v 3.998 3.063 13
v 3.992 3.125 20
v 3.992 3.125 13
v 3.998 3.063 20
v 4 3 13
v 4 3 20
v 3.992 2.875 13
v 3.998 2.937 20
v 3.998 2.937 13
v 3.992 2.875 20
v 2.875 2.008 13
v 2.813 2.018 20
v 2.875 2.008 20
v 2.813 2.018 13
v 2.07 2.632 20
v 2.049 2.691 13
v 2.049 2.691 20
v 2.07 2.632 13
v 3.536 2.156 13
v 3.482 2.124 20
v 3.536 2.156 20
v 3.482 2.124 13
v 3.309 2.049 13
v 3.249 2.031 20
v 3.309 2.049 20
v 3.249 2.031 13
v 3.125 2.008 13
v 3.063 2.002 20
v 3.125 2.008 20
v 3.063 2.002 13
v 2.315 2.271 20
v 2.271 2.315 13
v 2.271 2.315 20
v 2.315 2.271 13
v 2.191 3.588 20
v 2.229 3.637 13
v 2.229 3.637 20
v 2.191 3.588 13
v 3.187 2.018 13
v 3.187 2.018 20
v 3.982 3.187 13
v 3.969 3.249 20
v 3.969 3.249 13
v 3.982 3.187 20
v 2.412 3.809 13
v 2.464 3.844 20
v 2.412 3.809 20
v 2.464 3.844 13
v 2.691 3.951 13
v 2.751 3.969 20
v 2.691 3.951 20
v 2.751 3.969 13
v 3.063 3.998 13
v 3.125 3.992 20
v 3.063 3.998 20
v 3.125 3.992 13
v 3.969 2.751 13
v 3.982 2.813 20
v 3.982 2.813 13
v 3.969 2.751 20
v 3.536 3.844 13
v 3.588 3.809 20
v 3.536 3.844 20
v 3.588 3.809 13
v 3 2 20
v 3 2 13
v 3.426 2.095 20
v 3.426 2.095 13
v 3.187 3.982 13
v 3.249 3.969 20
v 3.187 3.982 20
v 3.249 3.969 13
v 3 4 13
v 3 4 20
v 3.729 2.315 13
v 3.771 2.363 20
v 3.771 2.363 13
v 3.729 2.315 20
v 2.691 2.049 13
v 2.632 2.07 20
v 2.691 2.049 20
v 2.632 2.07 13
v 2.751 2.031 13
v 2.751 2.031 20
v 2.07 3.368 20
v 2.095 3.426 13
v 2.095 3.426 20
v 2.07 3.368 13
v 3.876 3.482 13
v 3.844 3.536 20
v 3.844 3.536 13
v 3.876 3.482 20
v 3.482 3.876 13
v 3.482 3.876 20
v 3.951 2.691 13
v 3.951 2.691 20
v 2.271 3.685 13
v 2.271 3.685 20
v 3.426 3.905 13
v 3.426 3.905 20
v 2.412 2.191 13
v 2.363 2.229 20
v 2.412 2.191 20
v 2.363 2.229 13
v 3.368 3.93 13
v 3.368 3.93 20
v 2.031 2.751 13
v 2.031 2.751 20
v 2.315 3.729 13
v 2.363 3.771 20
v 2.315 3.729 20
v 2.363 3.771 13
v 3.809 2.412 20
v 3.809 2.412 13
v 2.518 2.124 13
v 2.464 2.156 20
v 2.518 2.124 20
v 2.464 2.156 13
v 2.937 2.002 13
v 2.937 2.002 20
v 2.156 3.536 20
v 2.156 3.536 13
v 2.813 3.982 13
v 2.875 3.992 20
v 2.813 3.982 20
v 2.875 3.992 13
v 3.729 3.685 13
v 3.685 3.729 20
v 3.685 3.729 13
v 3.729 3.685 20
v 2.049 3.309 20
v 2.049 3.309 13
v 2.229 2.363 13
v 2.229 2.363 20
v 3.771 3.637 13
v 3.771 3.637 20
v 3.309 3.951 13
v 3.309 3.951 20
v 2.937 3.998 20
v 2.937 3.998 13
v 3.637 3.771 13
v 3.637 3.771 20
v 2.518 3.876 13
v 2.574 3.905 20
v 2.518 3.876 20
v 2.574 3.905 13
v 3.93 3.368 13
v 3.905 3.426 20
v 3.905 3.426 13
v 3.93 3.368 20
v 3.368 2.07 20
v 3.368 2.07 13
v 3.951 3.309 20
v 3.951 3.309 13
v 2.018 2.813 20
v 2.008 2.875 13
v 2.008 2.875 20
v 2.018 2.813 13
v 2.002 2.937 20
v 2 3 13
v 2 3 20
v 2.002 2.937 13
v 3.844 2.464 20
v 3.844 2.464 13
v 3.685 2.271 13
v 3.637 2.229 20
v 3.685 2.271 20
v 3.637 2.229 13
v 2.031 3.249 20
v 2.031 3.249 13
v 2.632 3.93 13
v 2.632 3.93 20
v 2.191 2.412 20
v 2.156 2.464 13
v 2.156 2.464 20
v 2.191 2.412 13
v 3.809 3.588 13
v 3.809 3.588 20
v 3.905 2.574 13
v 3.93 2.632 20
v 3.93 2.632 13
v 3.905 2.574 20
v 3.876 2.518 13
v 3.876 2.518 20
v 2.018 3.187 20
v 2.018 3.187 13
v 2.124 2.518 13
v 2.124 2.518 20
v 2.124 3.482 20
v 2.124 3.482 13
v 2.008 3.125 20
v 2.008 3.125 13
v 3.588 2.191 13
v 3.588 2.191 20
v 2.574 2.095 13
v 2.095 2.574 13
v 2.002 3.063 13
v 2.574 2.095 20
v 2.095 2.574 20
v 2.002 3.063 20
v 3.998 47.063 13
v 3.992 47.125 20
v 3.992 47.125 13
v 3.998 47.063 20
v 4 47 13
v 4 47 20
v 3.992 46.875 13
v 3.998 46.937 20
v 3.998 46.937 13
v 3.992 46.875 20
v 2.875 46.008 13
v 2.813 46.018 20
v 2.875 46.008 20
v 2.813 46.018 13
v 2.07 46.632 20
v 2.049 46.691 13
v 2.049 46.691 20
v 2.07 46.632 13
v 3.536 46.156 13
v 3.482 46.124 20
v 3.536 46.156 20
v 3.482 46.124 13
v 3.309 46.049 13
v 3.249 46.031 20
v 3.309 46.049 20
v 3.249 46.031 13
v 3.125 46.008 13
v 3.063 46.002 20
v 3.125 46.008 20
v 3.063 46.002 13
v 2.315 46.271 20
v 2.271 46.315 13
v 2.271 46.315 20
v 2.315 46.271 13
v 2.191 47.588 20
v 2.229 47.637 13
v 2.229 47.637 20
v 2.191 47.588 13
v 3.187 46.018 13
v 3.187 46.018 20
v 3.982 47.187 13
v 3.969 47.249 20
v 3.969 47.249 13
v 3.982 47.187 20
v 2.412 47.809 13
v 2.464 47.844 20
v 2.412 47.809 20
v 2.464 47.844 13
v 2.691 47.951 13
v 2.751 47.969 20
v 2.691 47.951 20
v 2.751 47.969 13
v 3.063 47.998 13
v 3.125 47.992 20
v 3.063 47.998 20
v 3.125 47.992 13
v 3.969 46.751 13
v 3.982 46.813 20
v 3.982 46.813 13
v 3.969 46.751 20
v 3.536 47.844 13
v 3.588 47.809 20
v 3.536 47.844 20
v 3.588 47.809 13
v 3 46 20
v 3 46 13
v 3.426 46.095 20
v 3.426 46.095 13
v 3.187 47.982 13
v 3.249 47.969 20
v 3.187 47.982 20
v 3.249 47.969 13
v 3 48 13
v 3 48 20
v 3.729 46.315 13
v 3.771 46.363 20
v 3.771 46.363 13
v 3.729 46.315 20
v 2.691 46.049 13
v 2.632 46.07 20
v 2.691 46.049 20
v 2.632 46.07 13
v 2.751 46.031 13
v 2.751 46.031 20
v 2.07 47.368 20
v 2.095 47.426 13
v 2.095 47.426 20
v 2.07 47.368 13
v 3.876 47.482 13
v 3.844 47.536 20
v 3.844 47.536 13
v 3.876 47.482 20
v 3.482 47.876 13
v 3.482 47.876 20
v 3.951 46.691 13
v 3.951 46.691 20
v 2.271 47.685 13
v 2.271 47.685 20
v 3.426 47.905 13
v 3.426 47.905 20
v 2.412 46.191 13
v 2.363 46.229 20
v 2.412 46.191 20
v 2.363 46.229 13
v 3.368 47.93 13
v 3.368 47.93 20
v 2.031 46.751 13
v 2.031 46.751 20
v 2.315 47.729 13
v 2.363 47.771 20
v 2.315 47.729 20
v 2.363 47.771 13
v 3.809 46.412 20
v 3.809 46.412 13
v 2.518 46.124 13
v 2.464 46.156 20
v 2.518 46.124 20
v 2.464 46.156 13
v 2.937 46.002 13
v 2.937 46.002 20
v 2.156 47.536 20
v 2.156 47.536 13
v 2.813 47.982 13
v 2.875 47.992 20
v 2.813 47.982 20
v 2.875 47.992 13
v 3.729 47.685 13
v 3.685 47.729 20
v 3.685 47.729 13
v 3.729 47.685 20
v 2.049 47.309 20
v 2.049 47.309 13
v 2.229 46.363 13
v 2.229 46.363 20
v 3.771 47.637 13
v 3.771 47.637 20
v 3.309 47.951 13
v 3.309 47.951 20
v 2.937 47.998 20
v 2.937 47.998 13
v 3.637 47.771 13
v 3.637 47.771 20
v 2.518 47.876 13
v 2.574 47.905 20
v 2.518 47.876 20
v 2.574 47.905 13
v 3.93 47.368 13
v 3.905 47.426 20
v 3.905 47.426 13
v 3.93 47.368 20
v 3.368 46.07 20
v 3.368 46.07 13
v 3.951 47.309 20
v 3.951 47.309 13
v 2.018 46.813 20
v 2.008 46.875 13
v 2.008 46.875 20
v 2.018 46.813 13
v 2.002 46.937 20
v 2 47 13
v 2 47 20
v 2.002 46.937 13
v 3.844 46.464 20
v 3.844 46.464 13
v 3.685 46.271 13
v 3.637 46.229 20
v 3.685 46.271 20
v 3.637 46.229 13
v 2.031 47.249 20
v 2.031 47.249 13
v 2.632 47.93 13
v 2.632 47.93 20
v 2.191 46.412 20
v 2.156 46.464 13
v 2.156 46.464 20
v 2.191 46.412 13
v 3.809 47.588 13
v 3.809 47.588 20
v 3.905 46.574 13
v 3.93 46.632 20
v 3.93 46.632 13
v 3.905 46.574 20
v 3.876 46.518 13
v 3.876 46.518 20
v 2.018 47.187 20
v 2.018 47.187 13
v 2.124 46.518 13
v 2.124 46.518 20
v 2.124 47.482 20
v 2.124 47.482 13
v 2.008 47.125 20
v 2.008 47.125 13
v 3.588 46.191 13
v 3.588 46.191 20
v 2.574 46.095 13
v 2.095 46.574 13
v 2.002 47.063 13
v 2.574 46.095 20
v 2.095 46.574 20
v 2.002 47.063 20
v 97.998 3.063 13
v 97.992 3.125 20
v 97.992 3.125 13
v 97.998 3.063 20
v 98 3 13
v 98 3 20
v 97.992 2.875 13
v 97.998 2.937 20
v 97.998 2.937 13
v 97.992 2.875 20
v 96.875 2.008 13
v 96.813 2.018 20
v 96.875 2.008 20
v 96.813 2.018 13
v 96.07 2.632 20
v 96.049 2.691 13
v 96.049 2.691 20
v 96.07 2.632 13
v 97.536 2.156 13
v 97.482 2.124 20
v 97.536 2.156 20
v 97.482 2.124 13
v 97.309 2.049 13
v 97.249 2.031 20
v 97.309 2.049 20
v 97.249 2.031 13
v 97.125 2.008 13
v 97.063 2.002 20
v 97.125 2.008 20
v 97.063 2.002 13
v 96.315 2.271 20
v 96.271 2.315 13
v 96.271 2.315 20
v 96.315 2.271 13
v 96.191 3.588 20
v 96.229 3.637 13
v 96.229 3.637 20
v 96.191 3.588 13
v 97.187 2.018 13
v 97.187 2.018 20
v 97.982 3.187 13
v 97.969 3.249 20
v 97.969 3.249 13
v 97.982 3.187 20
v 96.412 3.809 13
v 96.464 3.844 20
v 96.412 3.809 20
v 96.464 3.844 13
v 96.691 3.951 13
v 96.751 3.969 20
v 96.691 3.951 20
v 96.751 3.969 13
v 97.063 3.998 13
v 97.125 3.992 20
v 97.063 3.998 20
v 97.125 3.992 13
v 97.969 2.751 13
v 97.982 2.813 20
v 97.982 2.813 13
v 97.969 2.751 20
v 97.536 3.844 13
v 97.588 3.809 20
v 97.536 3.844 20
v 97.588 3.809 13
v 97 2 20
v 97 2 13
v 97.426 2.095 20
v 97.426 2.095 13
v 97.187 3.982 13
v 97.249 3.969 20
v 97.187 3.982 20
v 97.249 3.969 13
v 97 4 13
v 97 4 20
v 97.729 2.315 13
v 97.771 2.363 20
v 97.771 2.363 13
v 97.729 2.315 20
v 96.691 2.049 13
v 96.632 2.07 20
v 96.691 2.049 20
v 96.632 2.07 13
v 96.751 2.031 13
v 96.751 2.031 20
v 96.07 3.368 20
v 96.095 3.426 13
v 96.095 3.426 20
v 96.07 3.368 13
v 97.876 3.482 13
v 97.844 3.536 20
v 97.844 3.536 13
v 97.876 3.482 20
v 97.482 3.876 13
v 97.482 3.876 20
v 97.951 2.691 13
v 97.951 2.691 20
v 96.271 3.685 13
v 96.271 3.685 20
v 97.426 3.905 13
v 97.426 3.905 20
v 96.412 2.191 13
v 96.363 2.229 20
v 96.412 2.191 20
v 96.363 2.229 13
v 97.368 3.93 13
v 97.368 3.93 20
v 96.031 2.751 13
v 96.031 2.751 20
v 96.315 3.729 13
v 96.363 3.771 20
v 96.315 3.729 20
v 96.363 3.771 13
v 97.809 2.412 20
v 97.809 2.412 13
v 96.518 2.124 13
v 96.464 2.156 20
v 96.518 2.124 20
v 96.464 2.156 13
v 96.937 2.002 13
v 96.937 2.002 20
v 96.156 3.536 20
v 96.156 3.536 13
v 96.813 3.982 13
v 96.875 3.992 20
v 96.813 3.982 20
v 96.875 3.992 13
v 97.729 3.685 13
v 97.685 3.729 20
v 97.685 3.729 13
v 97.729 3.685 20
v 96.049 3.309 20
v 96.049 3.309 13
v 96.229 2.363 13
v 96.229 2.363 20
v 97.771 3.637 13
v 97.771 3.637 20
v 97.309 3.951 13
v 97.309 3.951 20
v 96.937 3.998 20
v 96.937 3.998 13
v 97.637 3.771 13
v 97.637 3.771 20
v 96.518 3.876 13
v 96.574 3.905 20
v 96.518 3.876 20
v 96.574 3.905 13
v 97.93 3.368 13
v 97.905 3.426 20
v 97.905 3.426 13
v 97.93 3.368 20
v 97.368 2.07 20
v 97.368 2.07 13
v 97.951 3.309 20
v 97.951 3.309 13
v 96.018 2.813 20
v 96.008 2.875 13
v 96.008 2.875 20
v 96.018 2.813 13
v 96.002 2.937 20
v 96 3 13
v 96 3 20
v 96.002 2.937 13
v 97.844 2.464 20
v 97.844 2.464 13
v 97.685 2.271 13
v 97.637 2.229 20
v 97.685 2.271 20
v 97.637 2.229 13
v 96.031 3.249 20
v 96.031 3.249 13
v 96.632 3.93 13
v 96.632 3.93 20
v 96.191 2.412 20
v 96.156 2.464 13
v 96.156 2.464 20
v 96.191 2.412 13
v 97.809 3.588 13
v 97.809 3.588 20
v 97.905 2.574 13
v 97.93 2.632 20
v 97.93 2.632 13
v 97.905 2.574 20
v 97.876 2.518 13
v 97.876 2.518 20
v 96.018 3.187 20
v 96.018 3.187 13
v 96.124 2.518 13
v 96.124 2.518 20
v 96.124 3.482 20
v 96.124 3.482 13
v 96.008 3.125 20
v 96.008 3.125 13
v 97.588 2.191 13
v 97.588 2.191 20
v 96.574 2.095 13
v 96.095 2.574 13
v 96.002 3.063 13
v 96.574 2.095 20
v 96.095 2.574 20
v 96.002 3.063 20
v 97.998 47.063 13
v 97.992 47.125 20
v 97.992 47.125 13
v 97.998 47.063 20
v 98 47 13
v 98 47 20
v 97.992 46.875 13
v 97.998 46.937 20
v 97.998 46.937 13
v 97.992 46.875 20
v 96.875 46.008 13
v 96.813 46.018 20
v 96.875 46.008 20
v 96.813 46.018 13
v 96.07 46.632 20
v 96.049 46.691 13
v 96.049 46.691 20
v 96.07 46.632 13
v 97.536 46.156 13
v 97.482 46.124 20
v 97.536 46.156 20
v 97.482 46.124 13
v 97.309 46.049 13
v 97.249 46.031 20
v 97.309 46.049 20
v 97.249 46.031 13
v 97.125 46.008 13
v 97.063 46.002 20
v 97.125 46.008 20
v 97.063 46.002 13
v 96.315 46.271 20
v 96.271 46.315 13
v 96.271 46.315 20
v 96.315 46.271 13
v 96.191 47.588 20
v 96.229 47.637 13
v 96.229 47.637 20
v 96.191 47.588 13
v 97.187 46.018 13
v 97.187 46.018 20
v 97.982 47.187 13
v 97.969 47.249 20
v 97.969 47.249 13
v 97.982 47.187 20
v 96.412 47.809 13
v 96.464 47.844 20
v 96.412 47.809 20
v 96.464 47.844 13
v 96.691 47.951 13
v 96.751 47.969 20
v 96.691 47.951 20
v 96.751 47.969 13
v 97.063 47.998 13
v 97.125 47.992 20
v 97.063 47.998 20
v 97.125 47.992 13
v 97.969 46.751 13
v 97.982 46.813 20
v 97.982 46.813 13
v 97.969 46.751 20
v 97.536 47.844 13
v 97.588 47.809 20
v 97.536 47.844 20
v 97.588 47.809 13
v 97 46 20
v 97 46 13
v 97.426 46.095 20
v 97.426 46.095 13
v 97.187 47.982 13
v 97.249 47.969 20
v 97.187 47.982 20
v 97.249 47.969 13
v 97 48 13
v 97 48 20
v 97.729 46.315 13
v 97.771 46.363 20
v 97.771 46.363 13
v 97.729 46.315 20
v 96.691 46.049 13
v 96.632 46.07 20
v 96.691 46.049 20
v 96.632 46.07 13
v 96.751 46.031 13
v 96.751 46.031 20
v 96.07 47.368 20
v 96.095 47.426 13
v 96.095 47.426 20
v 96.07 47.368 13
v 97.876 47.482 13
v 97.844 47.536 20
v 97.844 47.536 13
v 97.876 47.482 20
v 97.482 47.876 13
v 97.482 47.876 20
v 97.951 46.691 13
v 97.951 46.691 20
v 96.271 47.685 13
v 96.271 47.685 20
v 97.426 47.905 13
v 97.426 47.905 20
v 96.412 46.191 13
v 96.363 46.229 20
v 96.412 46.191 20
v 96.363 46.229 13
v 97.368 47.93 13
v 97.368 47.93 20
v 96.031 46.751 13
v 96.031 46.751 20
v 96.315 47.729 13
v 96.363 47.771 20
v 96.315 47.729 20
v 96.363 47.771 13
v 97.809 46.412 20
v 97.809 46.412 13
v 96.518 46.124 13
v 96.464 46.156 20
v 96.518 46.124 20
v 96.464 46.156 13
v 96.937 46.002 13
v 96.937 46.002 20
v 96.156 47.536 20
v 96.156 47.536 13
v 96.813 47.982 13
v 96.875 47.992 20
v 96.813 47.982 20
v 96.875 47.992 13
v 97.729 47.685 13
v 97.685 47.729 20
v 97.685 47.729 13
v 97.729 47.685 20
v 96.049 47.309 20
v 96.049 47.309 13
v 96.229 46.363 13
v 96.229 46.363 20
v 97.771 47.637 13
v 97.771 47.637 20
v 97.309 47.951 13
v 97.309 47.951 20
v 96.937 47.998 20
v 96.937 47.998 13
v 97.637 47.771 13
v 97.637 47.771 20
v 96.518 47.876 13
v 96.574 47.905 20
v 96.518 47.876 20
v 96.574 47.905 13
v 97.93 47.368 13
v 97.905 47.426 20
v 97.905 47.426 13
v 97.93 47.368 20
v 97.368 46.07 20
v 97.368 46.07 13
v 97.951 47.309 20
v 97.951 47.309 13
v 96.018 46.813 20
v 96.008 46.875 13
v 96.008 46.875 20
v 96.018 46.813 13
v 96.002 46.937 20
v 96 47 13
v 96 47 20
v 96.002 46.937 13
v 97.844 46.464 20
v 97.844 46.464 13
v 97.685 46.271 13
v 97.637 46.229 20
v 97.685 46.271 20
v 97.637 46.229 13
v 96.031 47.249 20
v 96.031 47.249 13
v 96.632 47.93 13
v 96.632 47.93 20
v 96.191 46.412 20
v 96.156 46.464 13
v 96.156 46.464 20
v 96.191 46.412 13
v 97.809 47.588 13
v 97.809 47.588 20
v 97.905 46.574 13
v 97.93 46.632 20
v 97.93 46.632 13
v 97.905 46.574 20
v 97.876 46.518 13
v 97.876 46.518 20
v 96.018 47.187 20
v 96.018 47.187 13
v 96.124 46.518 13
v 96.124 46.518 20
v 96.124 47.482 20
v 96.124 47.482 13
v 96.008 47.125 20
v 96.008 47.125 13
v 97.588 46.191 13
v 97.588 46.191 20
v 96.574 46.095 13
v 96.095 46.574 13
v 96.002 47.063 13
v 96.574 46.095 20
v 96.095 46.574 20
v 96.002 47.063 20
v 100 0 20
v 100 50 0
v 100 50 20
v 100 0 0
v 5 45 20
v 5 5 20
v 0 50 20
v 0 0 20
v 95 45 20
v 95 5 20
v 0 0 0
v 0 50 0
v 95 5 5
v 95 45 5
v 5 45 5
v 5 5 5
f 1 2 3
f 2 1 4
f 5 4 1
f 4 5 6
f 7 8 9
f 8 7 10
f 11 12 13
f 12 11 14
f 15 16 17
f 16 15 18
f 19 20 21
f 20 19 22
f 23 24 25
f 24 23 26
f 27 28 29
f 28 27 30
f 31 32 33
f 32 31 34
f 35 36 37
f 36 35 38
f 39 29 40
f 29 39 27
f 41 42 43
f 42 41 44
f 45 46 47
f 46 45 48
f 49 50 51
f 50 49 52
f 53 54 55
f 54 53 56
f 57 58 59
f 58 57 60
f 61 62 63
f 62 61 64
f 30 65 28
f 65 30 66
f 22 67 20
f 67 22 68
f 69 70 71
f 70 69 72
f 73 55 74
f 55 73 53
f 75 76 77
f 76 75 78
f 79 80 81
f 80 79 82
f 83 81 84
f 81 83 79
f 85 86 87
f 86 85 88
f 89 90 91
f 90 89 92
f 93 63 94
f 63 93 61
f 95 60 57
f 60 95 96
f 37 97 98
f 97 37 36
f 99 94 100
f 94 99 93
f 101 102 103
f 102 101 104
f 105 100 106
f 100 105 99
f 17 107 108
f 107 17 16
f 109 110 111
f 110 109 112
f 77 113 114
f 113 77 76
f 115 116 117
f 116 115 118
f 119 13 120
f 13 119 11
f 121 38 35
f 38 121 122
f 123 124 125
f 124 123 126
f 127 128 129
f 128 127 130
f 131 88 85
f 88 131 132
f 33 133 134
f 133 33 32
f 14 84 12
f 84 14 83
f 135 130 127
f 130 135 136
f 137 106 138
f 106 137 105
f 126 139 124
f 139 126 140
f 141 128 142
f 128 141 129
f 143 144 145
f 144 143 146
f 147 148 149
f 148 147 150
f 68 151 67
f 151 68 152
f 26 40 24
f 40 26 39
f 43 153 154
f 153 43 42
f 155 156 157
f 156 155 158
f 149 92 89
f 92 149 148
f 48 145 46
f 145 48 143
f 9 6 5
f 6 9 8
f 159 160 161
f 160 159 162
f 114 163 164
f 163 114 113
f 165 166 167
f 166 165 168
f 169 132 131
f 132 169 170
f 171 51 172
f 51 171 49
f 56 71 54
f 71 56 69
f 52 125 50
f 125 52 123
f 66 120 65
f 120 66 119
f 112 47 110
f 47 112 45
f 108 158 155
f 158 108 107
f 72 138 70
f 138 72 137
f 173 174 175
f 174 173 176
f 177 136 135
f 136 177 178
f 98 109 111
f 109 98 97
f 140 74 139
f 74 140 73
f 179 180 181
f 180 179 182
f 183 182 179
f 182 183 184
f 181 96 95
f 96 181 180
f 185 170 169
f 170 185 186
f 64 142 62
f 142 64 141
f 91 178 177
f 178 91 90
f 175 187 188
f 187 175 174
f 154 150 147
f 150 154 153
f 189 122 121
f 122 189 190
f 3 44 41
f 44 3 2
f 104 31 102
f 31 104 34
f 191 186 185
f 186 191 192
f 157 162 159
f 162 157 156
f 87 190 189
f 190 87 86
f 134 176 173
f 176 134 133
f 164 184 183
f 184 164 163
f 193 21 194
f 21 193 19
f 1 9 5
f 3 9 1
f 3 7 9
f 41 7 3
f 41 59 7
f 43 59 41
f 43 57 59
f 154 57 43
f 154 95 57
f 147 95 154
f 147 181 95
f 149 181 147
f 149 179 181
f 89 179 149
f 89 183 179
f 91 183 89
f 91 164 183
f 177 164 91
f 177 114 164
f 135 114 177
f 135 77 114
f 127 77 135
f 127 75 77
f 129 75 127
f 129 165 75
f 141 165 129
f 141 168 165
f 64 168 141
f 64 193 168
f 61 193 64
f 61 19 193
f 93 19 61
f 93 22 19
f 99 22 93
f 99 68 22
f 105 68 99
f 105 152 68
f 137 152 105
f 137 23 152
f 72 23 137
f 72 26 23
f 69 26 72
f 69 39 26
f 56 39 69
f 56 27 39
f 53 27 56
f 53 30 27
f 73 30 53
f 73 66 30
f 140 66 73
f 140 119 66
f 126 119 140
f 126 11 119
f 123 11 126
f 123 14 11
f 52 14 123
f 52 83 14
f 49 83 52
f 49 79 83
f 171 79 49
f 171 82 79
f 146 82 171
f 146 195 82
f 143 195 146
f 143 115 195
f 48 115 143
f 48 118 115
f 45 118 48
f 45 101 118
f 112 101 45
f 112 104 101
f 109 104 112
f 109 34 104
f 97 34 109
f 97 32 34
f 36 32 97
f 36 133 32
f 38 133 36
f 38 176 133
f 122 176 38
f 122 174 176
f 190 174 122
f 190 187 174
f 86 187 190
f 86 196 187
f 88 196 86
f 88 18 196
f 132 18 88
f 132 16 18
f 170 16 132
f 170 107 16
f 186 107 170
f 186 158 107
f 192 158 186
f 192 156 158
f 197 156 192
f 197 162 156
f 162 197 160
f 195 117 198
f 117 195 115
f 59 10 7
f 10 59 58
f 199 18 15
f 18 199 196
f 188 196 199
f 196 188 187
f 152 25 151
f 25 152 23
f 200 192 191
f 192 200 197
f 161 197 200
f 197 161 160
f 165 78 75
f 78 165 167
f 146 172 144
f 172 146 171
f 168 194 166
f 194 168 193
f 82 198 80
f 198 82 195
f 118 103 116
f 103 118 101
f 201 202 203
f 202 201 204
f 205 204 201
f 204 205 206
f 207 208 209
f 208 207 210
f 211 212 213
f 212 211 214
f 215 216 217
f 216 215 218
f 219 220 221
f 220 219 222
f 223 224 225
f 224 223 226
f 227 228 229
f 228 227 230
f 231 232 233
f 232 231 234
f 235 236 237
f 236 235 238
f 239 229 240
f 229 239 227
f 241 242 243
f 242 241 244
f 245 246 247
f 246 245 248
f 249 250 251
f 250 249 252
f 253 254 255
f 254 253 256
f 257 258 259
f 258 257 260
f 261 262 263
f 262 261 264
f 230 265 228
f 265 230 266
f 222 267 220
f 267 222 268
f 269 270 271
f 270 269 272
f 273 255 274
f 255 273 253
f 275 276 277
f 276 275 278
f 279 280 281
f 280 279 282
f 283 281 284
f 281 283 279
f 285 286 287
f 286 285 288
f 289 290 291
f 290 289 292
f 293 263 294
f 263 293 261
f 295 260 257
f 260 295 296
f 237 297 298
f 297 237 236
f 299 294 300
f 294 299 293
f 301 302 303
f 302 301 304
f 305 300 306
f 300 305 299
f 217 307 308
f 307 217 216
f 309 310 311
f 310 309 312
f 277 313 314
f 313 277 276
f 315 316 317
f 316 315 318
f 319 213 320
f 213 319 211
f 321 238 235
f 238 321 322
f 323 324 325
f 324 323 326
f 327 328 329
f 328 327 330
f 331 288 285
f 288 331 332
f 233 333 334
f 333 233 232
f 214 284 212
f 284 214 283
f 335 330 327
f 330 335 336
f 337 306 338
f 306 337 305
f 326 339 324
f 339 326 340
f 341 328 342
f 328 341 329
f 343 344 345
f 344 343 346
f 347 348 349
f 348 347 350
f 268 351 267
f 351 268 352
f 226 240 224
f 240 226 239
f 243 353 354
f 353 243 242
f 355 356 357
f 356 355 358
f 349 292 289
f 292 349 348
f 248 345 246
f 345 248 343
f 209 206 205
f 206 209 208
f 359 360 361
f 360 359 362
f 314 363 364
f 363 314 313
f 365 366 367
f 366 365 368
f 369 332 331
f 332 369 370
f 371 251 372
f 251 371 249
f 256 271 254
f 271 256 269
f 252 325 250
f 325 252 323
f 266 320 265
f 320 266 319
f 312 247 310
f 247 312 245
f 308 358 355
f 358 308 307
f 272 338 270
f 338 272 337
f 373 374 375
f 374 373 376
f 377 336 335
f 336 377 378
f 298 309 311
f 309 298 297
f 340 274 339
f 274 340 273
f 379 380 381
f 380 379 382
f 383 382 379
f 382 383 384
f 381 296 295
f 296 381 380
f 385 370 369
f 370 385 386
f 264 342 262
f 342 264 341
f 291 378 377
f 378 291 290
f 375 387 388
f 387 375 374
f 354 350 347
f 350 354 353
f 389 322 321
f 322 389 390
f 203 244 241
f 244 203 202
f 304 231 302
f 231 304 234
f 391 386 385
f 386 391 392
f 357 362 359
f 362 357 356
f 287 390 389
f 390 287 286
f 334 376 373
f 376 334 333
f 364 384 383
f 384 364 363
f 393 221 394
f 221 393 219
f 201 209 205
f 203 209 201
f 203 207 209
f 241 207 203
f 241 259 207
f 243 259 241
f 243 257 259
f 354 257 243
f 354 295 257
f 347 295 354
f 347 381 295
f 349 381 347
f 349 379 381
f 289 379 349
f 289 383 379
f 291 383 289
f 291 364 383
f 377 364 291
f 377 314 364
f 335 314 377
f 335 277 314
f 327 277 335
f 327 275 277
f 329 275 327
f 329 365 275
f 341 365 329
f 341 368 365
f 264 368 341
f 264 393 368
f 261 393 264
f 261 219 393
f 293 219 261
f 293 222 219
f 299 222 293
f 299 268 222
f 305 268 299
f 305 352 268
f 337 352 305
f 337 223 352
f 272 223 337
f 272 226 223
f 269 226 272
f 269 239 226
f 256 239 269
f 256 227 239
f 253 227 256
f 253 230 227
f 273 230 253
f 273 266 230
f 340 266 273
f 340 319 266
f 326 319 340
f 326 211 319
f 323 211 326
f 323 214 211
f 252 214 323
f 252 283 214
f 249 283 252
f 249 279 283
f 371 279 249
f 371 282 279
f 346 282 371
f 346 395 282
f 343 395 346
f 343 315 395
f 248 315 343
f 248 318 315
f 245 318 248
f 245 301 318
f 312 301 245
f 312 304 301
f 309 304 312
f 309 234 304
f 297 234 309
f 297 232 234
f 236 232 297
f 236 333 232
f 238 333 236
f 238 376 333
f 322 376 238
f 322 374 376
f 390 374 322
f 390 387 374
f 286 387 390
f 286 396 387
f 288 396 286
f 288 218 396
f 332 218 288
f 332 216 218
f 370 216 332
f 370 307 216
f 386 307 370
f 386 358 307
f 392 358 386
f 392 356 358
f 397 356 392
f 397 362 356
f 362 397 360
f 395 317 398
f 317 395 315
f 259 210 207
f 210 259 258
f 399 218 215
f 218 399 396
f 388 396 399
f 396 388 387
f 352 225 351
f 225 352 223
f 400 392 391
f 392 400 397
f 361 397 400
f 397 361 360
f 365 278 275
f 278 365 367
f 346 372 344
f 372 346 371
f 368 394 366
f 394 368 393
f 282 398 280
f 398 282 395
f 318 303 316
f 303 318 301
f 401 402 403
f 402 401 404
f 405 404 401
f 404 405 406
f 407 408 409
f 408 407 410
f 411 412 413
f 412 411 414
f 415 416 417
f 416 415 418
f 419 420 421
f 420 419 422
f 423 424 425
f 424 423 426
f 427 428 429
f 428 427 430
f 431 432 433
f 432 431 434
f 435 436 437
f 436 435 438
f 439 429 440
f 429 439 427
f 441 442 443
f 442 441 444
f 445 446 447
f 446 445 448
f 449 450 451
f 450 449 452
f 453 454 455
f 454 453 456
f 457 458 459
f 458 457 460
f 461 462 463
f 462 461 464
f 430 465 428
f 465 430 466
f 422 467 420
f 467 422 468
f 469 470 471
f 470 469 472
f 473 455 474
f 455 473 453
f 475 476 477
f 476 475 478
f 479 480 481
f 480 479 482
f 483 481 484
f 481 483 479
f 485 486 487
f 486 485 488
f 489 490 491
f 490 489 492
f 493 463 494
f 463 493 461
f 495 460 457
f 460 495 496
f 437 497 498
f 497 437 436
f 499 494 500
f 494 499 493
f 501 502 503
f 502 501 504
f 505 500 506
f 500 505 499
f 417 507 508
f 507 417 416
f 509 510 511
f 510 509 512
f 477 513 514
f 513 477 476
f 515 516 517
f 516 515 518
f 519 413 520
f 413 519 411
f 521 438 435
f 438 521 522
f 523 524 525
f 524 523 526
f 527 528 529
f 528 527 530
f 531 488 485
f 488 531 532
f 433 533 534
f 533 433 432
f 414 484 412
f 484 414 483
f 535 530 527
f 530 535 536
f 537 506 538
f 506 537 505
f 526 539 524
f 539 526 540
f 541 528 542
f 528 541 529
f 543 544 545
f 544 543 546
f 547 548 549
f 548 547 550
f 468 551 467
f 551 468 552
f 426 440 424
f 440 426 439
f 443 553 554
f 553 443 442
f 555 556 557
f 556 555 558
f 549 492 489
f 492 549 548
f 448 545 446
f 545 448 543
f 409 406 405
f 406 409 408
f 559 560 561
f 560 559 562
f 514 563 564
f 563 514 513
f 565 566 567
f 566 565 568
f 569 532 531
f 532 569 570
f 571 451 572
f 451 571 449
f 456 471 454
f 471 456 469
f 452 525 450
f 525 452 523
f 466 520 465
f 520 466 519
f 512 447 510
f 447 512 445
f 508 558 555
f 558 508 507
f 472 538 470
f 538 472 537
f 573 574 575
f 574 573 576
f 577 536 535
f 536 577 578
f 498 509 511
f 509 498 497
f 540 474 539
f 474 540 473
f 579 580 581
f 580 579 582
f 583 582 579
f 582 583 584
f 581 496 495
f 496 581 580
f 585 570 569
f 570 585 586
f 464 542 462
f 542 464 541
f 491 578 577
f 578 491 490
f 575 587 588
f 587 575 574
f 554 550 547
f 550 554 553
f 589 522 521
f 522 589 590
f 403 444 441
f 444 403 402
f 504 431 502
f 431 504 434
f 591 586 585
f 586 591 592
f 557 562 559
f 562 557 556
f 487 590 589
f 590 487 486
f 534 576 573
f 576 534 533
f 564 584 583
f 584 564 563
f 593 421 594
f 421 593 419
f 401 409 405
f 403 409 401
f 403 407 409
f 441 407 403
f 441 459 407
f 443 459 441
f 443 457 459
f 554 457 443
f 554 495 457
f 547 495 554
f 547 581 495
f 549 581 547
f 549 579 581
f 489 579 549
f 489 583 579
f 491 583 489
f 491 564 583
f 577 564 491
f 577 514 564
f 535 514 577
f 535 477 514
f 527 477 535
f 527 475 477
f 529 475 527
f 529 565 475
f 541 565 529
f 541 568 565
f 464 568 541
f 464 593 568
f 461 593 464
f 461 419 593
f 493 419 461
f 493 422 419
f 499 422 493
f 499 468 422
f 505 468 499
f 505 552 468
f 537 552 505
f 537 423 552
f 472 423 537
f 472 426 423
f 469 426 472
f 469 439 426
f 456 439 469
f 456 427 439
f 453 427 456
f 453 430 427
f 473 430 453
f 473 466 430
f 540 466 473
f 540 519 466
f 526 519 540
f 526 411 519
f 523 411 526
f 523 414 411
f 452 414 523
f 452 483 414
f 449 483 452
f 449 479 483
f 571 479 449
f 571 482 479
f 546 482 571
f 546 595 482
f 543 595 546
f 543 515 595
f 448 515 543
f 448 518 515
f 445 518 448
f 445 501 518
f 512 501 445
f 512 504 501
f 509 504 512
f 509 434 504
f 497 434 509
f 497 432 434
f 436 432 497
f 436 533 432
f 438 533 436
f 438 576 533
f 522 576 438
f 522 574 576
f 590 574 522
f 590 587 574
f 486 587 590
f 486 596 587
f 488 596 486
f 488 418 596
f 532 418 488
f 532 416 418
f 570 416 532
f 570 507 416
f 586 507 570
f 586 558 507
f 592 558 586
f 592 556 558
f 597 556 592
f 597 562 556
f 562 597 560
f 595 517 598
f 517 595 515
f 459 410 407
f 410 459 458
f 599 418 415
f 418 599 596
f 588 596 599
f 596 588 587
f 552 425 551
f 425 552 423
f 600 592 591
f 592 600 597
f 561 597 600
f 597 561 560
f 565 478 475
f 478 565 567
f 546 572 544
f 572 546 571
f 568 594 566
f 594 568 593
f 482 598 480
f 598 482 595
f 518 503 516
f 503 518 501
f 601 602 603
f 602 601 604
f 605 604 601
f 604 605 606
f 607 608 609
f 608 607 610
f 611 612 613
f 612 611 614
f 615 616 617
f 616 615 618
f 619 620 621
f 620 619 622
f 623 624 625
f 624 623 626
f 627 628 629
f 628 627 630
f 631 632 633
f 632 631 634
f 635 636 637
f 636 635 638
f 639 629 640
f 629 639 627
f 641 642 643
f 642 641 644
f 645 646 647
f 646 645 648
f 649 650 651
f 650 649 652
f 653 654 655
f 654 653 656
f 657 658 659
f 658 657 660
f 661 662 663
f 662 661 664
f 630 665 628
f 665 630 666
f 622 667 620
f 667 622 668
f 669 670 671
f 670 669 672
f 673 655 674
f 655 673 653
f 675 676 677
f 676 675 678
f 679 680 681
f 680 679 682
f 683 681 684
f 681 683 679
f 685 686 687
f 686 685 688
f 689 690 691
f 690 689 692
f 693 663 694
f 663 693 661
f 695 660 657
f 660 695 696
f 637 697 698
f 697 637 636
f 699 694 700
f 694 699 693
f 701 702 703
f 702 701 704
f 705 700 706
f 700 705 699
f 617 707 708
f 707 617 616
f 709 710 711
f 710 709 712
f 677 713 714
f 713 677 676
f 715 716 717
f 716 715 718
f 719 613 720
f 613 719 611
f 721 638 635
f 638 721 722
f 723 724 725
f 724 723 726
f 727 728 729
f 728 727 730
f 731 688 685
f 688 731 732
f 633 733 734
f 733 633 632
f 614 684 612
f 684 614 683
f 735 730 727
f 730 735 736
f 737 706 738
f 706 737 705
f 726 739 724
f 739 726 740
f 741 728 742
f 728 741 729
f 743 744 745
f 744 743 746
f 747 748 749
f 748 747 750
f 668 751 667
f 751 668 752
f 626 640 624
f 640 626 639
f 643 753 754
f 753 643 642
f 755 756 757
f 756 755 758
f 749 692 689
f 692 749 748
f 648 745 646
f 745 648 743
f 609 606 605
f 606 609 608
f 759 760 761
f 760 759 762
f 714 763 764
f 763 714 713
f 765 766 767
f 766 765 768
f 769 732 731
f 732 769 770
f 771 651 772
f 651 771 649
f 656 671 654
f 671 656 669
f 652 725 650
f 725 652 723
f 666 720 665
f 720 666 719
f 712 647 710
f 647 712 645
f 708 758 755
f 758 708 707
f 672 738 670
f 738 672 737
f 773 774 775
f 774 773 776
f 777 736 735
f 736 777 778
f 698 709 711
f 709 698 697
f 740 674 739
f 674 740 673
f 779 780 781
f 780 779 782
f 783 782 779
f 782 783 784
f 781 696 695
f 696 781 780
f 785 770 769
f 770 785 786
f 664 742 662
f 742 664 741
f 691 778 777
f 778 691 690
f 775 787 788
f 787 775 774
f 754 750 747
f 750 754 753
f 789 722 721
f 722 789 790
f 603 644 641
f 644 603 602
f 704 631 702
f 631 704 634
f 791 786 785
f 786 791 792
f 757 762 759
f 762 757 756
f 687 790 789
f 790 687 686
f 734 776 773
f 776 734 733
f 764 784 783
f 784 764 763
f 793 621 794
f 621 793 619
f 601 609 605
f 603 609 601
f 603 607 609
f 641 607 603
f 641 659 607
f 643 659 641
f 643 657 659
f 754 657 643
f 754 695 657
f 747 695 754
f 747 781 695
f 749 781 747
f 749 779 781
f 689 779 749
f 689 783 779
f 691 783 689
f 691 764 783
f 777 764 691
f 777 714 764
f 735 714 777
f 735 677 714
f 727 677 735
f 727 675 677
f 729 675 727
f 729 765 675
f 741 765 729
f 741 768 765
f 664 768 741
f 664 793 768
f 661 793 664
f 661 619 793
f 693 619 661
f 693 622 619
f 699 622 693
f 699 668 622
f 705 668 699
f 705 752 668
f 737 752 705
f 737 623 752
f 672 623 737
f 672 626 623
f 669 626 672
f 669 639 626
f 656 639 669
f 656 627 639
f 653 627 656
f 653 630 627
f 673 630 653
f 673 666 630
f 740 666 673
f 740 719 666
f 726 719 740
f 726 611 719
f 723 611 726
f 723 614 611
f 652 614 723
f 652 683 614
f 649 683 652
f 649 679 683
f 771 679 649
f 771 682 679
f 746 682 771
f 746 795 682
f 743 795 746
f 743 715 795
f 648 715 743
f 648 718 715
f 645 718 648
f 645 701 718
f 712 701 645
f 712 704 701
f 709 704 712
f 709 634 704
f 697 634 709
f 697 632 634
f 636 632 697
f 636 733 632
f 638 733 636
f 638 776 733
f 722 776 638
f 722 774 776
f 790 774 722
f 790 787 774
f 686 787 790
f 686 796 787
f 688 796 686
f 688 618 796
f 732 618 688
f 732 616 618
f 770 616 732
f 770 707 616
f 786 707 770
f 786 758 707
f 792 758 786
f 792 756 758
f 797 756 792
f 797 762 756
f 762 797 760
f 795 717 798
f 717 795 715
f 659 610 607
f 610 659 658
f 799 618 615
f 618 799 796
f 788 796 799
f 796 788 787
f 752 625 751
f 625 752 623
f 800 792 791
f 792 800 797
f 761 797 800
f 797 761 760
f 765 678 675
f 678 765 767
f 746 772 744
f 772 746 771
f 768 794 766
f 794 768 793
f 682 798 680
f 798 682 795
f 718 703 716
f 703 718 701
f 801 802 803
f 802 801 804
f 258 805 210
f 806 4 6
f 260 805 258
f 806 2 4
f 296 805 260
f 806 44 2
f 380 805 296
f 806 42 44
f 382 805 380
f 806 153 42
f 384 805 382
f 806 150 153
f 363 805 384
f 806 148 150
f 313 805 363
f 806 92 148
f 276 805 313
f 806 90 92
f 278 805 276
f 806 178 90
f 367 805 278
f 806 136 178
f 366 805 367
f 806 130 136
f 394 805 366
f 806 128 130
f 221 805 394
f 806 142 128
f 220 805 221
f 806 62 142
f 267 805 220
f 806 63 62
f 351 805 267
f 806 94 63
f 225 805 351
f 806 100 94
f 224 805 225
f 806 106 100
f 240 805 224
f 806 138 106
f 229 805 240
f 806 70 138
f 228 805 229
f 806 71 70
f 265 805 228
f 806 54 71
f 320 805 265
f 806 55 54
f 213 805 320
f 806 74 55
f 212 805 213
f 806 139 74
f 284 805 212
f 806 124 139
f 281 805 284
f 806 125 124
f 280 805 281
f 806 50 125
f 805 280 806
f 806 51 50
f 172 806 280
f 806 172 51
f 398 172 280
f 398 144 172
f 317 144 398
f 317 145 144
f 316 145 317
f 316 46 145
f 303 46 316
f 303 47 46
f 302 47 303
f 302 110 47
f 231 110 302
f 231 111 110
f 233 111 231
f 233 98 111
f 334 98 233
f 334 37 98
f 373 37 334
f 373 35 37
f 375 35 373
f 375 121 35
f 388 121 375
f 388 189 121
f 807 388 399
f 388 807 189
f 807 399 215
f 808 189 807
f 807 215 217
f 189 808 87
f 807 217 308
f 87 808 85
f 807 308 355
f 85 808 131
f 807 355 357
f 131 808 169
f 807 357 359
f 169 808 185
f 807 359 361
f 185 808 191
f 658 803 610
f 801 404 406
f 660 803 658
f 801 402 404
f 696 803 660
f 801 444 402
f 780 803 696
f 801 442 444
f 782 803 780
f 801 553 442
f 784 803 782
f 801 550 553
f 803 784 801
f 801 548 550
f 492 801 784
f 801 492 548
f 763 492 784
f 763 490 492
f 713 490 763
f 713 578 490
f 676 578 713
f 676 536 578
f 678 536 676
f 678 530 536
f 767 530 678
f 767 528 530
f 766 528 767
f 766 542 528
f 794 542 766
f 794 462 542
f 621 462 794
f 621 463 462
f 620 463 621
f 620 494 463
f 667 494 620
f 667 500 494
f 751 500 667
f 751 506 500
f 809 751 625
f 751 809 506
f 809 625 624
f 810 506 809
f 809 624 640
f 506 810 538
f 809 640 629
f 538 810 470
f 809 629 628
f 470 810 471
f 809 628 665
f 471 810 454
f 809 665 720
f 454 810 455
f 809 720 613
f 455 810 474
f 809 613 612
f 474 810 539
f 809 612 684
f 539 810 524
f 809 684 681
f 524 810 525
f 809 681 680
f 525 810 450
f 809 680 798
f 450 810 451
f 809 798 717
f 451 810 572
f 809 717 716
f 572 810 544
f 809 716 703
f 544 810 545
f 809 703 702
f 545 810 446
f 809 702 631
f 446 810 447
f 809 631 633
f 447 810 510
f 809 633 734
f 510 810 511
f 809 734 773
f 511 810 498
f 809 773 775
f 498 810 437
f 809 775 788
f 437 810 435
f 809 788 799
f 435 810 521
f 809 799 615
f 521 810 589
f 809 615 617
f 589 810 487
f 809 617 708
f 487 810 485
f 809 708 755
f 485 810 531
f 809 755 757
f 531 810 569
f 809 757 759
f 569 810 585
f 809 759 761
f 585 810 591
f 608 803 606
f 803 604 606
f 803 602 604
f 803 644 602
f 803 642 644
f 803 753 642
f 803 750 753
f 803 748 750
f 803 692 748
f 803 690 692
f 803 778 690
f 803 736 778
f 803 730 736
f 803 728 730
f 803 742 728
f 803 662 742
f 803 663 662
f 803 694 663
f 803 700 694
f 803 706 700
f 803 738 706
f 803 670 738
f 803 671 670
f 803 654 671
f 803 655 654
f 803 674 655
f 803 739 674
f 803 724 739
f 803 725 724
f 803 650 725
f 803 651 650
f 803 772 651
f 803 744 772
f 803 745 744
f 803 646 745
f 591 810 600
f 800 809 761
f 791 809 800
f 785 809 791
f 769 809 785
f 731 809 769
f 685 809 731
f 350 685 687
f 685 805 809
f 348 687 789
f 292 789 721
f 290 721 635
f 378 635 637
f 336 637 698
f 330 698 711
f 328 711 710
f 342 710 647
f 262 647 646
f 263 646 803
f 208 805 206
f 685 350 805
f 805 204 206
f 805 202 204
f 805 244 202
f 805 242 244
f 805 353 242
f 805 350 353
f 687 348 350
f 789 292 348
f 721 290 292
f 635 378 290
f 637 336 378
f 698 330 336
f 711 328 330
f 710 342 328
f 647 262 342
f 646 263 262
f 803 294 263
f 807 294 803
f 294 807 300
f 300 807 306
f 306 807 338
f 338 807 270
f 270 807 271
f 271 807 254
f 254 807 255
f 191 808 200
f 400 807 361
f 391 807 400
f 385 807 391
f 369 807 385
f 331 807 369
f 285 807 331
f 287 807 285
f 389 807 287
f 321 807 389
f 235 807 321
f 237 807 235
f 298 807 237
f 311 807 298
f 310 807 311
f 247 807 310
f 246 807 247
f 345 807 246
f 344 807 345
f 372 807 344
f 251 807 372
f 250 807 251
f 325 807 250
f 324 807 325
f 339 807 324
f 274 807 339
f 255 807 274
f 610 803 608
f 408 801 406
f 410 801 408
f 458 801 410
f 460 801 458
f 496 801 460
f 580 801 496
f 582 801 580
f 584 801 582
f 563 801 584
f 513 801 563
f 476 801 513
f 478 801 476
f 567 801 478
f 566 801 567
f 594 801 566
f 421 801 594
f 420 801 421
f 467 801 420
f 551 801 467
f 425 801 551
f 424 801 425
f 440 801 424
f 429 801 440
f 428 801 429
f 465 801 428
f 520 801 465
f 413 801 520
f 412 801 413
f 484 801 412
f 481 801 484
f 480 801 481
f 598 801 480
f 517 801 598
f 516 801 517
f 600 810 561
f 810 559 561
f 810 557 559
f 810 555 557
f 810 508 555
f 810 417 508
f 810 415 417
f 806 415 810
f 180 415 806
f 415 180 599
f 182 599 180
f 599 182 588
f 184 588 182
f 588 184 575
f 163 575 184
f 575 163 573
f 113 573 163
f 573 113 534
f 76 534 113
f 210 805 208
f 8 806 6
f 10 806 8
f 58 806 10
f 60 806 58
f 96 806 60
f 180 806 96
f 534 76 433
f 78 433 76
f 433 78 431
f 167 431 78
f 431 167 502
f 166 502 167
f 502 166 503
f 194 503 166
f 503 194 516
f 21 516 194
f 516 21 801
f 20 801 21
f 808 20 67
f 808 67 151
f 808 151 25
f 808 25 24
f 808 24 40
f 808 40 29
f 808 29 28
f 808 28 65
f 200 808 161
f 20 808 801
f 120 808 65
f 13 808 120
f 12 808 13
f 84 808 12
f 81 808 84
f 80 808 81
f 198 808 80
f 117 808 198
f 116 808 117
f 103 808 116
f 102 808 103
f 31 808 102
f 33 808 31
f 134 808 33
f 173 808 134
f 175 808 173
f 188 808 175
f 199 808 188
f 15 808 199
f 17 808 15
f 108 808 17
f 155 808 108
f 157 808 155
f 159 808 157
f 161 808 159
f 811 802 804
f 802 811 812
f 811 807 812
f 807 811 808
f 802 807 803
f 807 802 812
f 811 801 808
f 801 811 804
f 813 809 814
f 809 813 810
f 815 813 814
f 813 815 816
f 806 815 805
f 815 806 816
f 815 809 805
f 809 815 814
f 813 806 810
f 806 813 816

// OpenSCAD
$fn = 100;

union() {
	difference() {
		cube(size = [100, 50, 20]);
		translate(v = [5, 5, 5]) {
			cube(size = [90, 40, 20]);
		}
		translate(v = [3, 3, 23]) {
			mirror(v = [0, 0, 1]) {
				union() {
					cylinder(h = 2.5, r1 = 2);
					cylinder(h = 10, r1 = 1);
				}
			}
		}
		translate(v = [3, 47, 23]) {
			mirror(v = [0, 0, 1]) {
				union() {
					cylinder(h = 2.5, r1 = 2);
					cylinder(h = 10, r1 = 1);
				}
			}
		}
		translate(v = [97, 3, 23]) {
			mirror(v = [0, 0, 1]) {
				union() {
					cylinder(h = 2.5, r1 = 2);
					cylinder(h = 10, r1 = 1);
				}
			}
		}
		translate(v = [97, 47, 23]) {
			mirror(v = [0, 0, 1]) {
				union() {
					cylinder(h = 2.5, r1 = 2);
					cylinder(h = 10, r1 = 1);
				}
			}
		}
	}
	%translate(v = [0, 0, 20]) {
		difference() {
			union() {
				translate(v = [0, 0, 0]) {
					cube(size = [100, 50, 5]);
				}
				translate(v = [5, 5, 5]) {
					linear_extrude(height = 1) {
						text(text = "box");
					}
				}
			}
			translate(v = [3, 3, 0.5]) {
				mirror(v = [0, 0, 1]) {
					union() {
						cylinder(h = 2.5, r1 = 2);
						cylinder(h = 10, r1 = 1);
					}
				}
			}
			translate(v = [3, 47, 0.5]) {
				mirror(v = [0, 0, 1]) {
					union() {
						cylinder(h = 2.5, r1 = 2);
						cylinder(h = 10, r1 = 1);
					}
				}
			}
			translate(v = [97, 3, 0.5]) {
				mirror(v = [0, 0, 1]) {
					union() {
						cylinder(h = 2.5, r1 = 2);
						cylinder(h = 10, r1 = 1);
					}
				}
			}
			translate(v = [97, 47, 0.5]) {
				mirror(v = [0, 0, 1]) {
					union() {
						cylinder(h = 2.5, r1 = 2);
						cylinder(h = 10, r1 = 1);
					}
				}
			}
		}
	}
}
